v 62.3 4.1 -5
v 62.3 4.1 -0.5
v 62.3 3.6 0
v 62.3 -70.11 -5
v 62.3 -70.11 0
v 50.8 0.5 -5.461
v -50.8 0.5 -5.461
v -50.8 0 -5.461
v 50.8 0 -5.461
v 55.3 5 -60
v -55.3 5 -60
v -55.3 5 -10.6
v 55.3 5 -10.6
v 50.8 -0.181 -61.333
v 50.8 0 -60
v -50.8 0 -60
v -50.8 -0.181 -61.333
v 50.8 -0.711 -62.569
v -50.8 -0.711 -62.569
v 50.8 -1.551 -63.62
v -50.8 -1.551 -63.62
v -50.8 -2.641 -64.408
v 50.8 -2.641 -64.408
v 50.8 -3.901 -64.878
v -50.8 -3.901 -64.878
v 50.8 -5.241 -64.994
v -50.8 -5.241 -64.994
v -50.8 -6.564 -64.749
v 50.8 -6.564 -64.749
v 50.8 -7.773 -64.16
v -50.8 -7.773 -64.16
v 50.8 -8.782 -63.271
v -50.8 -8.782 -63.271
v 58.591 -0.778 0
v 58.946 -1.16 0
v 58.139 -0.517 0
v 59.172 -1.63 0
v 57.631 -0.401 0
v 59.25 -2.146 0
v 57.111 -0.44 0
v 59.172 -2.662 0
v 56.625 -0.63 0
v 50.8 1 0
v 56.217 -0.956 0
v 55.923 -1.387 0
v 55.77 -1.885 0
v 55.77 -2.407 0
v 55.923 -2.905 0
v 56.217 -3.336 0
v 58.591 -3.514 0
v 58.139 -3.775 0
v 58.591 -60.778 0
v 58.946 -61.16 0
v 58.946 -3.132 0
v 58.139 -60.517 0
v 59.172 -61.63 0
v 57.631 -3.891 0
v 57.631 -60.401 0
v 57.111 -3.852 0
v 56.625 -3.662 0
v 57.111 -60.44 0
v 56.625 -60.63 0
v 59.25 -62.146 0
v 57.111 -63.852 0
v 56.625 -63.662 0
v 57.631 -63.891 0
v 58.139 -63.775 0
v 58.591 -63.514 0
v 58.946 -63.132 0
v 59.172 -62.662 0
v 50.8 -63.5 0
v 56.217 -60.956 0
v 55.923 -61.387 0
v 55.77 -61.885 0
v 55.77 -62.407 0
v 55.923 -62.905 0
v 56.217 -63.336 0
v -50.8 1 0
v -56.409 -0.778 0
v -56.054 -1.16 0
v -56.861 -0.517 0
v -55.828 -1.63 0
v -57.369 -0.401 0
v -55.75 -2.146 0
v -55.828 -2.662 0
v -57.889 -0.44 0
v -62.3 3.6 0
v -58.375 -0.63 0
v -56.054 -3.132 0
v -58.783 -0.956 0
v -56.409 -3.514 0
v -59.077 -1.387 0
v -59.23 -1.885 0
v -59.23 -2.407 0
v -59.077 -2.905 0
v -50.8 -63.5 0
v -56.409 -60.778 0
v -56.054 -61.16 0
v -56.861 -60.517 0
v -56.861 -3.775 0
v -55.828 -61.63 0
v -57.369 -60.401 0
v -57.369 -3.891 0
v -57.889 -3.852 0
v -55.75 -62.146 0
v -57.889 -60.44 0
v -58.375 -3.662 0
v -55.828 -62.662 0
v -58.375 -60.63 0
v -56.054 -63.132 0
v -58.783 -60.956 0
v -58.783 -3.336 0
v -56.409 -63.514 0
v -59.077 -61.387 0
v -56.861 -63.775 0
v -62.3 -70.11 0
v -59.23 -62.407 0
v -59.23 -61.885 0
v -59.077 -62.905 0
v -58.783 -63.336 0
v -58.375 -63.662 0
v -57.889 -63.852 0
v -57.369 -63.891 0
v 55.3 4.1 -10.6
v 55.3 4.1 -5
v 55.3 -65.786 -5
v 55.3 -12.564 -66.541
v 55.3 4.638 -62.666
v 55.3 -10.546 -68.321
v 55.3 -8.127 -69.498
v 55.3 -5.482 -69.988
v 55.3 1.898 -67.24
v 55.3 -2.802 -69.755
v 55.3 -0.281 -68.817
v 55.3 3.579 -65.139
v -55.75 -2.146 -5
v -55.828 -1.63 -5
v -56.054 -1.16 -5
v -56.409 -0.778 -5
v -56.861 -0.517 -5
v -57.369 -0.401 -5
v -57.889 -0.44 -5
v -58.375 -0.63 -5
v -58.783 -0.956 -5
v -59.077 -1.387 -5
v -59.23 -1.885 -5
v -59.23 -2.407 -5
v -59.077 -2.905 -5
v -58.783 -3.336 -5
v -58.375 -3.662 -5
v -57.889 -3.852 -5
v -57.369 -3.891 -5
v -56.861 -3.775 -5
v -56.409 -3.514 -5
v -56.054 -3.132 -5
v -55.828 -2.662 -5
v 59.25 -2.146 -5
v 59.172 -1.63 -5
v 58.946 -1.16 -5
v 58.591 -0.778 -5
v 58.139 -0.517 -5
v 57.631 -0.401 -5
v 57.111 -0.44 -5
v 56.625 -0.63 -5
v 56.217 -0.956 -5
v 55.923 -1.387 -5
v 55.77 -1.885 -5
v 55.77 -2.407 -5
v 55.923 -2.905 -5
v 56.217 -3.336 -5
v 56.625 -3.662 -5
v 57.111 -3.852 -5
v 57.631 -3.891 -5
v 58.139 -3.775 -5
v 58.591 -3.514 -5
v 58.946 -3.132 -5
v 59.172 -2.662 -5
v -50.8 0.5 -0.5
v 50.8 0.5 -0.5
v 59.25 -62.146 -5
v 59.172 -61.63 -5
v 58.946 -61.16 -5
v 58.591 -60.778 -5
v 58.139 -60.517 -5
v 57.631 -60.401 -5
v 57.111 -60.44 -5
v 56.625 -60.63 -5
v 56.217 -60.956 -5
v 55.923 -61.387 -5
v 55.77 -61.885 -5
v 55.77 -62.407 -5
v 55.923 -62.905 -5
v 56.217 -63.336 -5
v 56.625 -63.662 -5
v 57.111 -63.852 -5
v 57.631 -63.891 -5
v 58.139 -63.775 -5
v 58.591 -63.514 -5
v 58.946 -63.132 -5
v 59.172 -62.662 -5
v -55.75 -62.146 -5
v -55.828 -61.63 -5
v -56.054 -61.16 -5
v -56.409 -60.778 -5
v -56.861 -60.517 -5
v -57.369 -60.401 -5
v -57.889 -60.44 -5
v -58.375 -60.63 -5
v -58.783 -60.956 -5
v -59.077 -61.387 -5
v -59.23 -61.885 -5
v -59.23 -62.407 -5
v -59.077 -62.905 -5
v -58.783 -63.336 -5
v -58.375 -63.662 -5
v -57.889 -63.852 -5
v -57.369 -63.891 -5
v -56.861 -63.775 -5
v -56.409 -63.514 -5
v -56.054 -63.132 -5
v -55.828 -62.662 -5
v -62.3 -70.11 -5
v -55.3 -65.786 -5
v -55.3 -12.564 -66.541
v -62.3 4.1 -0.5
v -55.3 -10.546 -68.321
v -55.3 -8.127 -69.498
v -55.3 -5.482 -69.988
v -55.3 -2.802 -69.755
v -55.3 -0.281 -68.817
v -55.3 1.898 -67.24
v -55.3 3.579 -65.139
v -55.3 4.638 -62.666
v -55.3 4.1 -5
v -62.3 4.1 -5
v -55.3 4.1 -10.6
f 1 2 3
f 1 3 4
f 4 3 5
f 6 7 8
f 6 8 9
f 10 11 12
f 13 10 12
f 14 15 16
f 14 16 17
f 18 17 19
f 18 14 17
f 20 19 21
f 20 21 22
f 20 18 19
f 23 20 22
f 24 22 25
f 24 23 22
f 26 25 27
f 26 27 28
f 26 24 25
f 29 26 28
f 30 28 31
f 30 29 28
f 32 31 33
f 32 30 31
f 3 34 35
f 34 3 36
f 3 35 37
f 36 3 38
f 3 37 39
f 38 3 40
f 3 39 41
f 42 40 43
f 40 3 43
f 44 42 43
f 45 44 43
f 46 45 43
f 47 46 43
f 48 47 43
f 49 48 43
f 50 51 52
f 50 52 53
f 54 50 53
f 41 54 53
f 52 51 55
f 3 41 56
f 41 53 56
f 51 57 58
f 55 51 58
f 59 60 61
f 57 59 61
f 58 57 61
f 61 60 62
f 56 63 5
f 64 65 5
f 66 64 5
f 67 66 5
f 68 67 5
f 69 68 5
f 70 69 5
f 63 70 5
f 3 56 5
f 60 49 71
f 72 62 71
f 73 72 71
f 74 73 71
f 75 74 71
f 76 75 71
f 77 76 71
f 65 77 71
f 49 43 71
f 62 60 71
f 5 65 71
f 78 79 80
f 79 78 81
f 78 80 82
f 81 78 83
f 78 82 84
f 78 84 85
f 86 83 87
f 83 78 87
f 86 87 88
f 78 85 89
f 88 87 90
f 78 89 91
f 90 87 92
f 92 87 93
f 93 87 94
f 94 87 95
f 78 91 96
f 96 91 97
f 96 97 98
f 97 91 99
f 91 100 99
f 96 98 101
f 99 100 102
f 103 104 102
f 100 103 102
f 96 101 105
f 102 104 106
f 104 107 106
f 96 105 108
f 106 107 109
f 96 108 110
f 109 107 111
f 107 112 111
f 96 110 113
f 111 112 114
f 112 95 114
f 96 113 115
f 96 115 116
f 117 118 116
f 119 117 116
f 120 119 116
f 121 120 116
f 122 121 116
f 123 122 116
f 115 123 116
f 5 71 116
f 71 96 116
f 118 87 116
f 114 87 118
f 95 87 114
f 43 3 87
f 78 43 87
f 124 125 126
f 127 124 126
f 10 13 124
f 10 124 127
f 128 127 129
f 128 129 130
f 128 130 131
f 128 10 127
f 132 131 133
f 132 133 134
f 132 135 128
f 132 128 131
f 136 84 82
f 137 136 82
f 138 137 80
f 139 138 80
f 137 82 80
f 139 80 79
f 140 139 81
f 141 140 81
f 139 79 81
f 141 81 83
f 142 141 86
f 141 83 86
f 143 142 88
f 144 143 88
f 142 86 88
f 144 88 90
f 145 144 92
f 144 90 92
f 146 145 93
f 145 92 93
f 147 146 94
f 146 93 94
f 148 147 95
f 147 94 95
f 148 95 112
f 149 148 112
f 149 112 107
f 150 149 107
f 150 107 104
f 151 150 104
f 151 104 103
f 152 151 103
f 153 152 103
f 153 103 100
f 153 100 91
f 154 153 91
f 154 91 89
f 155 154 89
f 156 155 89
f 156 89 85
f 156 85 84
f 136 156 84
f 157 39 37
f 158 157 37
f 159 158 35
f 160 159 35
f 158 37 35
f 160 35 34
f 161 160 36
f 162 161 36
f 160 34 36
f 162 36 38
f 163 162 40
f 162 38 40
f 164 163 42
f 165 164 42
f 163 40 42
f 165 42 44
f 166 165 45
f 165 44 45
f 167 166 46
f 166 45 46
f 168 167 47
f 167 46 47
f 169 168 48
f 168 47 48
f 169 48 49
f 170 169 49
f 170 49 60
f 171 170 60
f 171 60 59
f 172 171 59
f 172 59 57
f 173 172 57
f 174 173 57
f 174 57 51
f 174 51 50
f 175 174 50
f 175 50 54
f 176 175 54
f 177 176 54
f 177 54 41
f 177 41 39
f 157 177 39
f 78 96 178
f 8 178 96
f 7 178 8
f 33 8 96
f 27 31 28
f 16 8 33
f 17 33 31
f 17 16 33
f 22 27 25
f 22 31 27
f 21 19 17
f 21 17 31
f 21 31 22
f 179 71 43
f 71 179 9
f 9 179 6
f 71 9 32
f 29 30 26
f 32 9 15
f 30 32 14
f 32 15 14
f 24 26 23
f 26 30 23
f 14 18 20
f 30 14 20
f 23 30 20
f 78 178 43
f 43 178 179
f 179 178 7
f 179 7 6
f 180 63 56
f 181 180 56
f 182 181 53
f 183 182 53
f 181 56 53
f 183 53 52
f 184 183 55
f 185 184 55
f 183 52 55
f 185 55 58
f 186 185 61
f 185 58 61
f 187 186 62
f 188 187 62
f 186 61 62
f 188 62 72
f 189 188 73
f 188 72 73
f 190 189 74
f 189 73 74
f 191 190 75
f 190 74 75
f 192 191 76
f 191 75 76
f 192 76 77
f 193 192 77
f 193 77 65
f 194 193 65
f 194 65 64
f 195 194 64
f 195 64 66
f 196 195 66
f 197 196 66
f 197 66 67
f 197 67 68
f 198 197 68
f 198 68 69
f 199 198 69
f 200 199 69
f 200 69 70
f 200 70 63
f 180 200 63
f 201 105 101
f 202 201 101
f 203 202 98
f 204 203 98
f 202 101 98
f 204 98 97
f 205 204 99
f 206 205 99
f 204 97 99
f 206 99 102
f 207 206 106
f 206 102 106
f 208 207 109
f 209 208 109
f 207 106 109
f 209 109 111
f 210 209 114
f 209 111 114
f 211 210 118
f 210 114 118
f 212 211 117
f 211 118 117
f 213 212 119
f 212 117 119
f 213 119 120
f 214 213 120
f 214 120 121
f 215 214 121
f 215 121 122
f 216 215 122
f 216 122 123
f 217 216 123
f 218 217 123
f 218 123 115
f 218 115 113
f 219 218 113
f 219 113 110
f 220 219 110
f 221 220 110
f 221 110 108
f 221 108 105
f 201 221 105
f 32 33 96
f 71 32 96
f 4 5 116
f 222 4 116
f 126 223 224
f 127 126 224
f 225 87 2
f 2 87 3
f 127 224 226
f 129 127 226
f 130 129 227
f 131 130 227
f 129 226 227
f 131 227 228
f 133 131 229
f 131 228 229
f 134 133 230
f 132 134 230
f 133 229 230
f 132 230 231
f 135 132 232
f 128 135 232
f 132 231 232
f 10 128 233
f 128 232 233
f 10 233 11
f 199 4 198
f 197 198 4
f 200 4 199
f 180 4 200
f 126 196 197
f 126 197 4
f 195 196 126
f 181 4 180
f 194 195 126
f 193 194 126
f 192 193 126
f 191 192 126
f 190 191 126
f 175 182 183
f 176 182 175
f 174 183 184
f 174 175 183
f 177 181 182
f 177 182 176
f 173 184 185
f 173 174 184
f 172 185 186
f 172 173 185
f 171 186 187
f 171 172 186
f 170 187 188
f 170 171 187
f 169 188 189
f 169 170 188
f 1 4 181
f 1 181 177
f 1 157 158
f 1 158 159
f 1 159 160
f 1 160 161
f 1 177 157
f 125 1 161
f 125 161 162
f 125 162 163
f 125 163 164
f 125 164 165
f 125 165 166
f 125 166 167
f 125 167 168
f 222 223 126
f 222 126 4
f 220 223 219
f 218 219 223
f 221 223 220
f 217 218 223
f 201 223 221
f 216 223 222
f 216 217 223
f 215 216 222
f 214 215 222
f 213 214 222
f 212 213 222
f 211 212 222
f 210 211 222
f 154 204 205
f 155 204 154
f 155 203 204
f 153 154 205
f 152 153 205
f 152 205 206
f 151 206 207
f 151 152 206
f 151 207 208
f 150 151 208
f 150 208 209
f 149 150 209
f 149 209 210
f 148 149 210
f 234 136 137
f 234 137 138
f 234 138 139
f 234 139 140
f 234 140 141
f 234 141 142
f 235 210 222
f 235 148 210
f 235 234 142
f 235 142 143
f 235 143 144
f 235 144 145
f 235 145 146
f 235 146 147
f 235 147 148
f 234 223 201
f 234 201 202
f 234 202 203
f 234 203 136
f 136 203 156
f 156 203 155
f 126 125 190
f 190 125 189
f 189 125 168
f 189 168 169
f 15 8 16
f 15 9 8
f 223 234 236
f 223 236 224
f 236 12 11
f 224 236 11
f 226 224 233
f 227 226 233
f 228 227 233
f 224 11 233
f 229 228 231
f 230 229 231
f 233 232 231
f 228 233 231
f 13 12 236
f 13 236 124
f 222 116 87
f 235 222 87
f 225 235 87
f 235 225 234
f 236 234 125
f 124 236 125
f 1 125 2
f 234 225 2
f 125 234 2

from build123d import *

# Parameters (mm, degrees)
BOSS_EXTRUDE1_DEPTH = 50.8
BOSS_EXTRUDE3_START = 4.5
BOSS_EXTRUDE3_DEPTH = 4.5
BOSS_EXTRUDE4_DEPTH = 5
SKETCH6_R           = 1.75
CUT_EXTRUDE1_DEPTH  = 18.75
SKETCH7_W           = 101.6
SKETCH7_H           = 0.5
CUT_EXTRUDE2_DEPTH  = 5.461
SKETCH8_W           = 124.6
SKETCH8_H           = 0.9
CUT_EXTRUDE3_DEPTH  = 10.6
FILLET1_SIZE        = 0.5


with BuildPart() as part:
    # Sketch1 → Boss-Extrude1 (new, symmetric)
    with BuildSketch(Plane(origin=(0, 0, 0), x_dir=(0, 0, -1), z_dir=(1, 0, 0))):
        with BuildLine():
            Line((0, 0), (60, 0))
            ThreePointArc((60, 0), (64.685586675, -3.254927648), (63.270675103, -8.781888995))
            Line((63.270675103, -8.781888995), (0, -63.5))
            Line((0, -63.5), (0, -70.110453145))
            Line((0, -70.110453145), (66.541350207, -12.56377799))
            ThreePointArc((66.541350207, -12.56377799), (69.37117335, -1.509855296), (60, 5))
            Line((60, 5), (0, 5))
            Line((0, 5), (0, 0))
        make_face()
    extrude(amount=BOSS_EXTRUDE1_DEPTH, both=True)

    # Sketch3 → Boss-Extrude3 (add)
    with BuildSketch(Plane(origin=(50.8, 0, 0), x_dir=(0, 0, -1), z_dir=(1, 0, 0)).offset(BOSS_EXTRUDE3_START)):
        with BuildLine():
            Line((0, -70.110453145), (66.541350207, -12.56377799))
            ThreePointArc((66.541350207, -12.56377799), (69.37117335, -1.509855296), (60, 5))
            Line((60, 5), (0, 5))
            Line((0, 5), (0, -70.110453145))
        make_face()
    boss_extrude3 = extrude(amount=-BOSS_EXTRUDE3_DEPTH)

    # Mirror1: Boss-Extrude3 across plane
    add(boss_extrude3.mirror(Plane(origin=(0, 0, 0), x_dir=(0, 0, 1), z_dir=(1, 0, 0))))

    # Sketch4 → Boss-Extrude4 (add)
    with BuildSketch(Plane.XY):
        Polygon((-50.8, 5), (-62.3, 5), (-62.3, -70.110453145), (62.3, -70.110453145), (62.3, 5), (50.8, 5), (50.8, -63.5), (-50.8, -63.5), align=None)
    extrude(amount=-BOSS_EXTRUDE4_DEPTH)

    # Sketch6 → Cut-Extrude1 (cut)
    with BuildSketch(Plane.XY):
        with Locations((-57.5, -2.146)):
            Circle(SKETCH6_R)
        with Locations((-57.5, -62.146)):
            Circle(SKETCH6_R)
        with Locations((57.5, -62.146)):
            Circle(SKETCH6_R)
        with Locations((57.5, -2.146)):
            Circle(SKETCH6_R)
    extrude(amount=-CUT_EXTRUDE1_DEPTH, mode=Mode.SUBTRACT)

    # Sketch7 → Cut-Extrude2 (cut)
    with BuildSketch(Plane.XY):
        with Locations((0, 0.25)):
            Rectangle(SKETCH7_W, SKETCH7_H)
    extrude(amount=-CUT_EXTRUDE2_DEPTH, mode=Mode.SUBTRACT)

    # Sketch8 → Cut-Extrude3 (cut)
    with BuildSketch(Plane.XY):
        with Locations((0, 4.55)):
            Rectangle(SKETCH8_W, SKETCH8_H)
    extrude(amount=-CUT_EXTRUDE3_DEPTH, mode=Mode.SUBTRACT)

    # Fillet1
    fillet1_edges = [part.edges().sort_by_distance(p)[0] for p in [
        (0, 0.5, 0),
        (0, 4.1, 0),
    ]]
    chamfer(fillet1_edges, length=FILLET1_SIZE)


solid = part.part
